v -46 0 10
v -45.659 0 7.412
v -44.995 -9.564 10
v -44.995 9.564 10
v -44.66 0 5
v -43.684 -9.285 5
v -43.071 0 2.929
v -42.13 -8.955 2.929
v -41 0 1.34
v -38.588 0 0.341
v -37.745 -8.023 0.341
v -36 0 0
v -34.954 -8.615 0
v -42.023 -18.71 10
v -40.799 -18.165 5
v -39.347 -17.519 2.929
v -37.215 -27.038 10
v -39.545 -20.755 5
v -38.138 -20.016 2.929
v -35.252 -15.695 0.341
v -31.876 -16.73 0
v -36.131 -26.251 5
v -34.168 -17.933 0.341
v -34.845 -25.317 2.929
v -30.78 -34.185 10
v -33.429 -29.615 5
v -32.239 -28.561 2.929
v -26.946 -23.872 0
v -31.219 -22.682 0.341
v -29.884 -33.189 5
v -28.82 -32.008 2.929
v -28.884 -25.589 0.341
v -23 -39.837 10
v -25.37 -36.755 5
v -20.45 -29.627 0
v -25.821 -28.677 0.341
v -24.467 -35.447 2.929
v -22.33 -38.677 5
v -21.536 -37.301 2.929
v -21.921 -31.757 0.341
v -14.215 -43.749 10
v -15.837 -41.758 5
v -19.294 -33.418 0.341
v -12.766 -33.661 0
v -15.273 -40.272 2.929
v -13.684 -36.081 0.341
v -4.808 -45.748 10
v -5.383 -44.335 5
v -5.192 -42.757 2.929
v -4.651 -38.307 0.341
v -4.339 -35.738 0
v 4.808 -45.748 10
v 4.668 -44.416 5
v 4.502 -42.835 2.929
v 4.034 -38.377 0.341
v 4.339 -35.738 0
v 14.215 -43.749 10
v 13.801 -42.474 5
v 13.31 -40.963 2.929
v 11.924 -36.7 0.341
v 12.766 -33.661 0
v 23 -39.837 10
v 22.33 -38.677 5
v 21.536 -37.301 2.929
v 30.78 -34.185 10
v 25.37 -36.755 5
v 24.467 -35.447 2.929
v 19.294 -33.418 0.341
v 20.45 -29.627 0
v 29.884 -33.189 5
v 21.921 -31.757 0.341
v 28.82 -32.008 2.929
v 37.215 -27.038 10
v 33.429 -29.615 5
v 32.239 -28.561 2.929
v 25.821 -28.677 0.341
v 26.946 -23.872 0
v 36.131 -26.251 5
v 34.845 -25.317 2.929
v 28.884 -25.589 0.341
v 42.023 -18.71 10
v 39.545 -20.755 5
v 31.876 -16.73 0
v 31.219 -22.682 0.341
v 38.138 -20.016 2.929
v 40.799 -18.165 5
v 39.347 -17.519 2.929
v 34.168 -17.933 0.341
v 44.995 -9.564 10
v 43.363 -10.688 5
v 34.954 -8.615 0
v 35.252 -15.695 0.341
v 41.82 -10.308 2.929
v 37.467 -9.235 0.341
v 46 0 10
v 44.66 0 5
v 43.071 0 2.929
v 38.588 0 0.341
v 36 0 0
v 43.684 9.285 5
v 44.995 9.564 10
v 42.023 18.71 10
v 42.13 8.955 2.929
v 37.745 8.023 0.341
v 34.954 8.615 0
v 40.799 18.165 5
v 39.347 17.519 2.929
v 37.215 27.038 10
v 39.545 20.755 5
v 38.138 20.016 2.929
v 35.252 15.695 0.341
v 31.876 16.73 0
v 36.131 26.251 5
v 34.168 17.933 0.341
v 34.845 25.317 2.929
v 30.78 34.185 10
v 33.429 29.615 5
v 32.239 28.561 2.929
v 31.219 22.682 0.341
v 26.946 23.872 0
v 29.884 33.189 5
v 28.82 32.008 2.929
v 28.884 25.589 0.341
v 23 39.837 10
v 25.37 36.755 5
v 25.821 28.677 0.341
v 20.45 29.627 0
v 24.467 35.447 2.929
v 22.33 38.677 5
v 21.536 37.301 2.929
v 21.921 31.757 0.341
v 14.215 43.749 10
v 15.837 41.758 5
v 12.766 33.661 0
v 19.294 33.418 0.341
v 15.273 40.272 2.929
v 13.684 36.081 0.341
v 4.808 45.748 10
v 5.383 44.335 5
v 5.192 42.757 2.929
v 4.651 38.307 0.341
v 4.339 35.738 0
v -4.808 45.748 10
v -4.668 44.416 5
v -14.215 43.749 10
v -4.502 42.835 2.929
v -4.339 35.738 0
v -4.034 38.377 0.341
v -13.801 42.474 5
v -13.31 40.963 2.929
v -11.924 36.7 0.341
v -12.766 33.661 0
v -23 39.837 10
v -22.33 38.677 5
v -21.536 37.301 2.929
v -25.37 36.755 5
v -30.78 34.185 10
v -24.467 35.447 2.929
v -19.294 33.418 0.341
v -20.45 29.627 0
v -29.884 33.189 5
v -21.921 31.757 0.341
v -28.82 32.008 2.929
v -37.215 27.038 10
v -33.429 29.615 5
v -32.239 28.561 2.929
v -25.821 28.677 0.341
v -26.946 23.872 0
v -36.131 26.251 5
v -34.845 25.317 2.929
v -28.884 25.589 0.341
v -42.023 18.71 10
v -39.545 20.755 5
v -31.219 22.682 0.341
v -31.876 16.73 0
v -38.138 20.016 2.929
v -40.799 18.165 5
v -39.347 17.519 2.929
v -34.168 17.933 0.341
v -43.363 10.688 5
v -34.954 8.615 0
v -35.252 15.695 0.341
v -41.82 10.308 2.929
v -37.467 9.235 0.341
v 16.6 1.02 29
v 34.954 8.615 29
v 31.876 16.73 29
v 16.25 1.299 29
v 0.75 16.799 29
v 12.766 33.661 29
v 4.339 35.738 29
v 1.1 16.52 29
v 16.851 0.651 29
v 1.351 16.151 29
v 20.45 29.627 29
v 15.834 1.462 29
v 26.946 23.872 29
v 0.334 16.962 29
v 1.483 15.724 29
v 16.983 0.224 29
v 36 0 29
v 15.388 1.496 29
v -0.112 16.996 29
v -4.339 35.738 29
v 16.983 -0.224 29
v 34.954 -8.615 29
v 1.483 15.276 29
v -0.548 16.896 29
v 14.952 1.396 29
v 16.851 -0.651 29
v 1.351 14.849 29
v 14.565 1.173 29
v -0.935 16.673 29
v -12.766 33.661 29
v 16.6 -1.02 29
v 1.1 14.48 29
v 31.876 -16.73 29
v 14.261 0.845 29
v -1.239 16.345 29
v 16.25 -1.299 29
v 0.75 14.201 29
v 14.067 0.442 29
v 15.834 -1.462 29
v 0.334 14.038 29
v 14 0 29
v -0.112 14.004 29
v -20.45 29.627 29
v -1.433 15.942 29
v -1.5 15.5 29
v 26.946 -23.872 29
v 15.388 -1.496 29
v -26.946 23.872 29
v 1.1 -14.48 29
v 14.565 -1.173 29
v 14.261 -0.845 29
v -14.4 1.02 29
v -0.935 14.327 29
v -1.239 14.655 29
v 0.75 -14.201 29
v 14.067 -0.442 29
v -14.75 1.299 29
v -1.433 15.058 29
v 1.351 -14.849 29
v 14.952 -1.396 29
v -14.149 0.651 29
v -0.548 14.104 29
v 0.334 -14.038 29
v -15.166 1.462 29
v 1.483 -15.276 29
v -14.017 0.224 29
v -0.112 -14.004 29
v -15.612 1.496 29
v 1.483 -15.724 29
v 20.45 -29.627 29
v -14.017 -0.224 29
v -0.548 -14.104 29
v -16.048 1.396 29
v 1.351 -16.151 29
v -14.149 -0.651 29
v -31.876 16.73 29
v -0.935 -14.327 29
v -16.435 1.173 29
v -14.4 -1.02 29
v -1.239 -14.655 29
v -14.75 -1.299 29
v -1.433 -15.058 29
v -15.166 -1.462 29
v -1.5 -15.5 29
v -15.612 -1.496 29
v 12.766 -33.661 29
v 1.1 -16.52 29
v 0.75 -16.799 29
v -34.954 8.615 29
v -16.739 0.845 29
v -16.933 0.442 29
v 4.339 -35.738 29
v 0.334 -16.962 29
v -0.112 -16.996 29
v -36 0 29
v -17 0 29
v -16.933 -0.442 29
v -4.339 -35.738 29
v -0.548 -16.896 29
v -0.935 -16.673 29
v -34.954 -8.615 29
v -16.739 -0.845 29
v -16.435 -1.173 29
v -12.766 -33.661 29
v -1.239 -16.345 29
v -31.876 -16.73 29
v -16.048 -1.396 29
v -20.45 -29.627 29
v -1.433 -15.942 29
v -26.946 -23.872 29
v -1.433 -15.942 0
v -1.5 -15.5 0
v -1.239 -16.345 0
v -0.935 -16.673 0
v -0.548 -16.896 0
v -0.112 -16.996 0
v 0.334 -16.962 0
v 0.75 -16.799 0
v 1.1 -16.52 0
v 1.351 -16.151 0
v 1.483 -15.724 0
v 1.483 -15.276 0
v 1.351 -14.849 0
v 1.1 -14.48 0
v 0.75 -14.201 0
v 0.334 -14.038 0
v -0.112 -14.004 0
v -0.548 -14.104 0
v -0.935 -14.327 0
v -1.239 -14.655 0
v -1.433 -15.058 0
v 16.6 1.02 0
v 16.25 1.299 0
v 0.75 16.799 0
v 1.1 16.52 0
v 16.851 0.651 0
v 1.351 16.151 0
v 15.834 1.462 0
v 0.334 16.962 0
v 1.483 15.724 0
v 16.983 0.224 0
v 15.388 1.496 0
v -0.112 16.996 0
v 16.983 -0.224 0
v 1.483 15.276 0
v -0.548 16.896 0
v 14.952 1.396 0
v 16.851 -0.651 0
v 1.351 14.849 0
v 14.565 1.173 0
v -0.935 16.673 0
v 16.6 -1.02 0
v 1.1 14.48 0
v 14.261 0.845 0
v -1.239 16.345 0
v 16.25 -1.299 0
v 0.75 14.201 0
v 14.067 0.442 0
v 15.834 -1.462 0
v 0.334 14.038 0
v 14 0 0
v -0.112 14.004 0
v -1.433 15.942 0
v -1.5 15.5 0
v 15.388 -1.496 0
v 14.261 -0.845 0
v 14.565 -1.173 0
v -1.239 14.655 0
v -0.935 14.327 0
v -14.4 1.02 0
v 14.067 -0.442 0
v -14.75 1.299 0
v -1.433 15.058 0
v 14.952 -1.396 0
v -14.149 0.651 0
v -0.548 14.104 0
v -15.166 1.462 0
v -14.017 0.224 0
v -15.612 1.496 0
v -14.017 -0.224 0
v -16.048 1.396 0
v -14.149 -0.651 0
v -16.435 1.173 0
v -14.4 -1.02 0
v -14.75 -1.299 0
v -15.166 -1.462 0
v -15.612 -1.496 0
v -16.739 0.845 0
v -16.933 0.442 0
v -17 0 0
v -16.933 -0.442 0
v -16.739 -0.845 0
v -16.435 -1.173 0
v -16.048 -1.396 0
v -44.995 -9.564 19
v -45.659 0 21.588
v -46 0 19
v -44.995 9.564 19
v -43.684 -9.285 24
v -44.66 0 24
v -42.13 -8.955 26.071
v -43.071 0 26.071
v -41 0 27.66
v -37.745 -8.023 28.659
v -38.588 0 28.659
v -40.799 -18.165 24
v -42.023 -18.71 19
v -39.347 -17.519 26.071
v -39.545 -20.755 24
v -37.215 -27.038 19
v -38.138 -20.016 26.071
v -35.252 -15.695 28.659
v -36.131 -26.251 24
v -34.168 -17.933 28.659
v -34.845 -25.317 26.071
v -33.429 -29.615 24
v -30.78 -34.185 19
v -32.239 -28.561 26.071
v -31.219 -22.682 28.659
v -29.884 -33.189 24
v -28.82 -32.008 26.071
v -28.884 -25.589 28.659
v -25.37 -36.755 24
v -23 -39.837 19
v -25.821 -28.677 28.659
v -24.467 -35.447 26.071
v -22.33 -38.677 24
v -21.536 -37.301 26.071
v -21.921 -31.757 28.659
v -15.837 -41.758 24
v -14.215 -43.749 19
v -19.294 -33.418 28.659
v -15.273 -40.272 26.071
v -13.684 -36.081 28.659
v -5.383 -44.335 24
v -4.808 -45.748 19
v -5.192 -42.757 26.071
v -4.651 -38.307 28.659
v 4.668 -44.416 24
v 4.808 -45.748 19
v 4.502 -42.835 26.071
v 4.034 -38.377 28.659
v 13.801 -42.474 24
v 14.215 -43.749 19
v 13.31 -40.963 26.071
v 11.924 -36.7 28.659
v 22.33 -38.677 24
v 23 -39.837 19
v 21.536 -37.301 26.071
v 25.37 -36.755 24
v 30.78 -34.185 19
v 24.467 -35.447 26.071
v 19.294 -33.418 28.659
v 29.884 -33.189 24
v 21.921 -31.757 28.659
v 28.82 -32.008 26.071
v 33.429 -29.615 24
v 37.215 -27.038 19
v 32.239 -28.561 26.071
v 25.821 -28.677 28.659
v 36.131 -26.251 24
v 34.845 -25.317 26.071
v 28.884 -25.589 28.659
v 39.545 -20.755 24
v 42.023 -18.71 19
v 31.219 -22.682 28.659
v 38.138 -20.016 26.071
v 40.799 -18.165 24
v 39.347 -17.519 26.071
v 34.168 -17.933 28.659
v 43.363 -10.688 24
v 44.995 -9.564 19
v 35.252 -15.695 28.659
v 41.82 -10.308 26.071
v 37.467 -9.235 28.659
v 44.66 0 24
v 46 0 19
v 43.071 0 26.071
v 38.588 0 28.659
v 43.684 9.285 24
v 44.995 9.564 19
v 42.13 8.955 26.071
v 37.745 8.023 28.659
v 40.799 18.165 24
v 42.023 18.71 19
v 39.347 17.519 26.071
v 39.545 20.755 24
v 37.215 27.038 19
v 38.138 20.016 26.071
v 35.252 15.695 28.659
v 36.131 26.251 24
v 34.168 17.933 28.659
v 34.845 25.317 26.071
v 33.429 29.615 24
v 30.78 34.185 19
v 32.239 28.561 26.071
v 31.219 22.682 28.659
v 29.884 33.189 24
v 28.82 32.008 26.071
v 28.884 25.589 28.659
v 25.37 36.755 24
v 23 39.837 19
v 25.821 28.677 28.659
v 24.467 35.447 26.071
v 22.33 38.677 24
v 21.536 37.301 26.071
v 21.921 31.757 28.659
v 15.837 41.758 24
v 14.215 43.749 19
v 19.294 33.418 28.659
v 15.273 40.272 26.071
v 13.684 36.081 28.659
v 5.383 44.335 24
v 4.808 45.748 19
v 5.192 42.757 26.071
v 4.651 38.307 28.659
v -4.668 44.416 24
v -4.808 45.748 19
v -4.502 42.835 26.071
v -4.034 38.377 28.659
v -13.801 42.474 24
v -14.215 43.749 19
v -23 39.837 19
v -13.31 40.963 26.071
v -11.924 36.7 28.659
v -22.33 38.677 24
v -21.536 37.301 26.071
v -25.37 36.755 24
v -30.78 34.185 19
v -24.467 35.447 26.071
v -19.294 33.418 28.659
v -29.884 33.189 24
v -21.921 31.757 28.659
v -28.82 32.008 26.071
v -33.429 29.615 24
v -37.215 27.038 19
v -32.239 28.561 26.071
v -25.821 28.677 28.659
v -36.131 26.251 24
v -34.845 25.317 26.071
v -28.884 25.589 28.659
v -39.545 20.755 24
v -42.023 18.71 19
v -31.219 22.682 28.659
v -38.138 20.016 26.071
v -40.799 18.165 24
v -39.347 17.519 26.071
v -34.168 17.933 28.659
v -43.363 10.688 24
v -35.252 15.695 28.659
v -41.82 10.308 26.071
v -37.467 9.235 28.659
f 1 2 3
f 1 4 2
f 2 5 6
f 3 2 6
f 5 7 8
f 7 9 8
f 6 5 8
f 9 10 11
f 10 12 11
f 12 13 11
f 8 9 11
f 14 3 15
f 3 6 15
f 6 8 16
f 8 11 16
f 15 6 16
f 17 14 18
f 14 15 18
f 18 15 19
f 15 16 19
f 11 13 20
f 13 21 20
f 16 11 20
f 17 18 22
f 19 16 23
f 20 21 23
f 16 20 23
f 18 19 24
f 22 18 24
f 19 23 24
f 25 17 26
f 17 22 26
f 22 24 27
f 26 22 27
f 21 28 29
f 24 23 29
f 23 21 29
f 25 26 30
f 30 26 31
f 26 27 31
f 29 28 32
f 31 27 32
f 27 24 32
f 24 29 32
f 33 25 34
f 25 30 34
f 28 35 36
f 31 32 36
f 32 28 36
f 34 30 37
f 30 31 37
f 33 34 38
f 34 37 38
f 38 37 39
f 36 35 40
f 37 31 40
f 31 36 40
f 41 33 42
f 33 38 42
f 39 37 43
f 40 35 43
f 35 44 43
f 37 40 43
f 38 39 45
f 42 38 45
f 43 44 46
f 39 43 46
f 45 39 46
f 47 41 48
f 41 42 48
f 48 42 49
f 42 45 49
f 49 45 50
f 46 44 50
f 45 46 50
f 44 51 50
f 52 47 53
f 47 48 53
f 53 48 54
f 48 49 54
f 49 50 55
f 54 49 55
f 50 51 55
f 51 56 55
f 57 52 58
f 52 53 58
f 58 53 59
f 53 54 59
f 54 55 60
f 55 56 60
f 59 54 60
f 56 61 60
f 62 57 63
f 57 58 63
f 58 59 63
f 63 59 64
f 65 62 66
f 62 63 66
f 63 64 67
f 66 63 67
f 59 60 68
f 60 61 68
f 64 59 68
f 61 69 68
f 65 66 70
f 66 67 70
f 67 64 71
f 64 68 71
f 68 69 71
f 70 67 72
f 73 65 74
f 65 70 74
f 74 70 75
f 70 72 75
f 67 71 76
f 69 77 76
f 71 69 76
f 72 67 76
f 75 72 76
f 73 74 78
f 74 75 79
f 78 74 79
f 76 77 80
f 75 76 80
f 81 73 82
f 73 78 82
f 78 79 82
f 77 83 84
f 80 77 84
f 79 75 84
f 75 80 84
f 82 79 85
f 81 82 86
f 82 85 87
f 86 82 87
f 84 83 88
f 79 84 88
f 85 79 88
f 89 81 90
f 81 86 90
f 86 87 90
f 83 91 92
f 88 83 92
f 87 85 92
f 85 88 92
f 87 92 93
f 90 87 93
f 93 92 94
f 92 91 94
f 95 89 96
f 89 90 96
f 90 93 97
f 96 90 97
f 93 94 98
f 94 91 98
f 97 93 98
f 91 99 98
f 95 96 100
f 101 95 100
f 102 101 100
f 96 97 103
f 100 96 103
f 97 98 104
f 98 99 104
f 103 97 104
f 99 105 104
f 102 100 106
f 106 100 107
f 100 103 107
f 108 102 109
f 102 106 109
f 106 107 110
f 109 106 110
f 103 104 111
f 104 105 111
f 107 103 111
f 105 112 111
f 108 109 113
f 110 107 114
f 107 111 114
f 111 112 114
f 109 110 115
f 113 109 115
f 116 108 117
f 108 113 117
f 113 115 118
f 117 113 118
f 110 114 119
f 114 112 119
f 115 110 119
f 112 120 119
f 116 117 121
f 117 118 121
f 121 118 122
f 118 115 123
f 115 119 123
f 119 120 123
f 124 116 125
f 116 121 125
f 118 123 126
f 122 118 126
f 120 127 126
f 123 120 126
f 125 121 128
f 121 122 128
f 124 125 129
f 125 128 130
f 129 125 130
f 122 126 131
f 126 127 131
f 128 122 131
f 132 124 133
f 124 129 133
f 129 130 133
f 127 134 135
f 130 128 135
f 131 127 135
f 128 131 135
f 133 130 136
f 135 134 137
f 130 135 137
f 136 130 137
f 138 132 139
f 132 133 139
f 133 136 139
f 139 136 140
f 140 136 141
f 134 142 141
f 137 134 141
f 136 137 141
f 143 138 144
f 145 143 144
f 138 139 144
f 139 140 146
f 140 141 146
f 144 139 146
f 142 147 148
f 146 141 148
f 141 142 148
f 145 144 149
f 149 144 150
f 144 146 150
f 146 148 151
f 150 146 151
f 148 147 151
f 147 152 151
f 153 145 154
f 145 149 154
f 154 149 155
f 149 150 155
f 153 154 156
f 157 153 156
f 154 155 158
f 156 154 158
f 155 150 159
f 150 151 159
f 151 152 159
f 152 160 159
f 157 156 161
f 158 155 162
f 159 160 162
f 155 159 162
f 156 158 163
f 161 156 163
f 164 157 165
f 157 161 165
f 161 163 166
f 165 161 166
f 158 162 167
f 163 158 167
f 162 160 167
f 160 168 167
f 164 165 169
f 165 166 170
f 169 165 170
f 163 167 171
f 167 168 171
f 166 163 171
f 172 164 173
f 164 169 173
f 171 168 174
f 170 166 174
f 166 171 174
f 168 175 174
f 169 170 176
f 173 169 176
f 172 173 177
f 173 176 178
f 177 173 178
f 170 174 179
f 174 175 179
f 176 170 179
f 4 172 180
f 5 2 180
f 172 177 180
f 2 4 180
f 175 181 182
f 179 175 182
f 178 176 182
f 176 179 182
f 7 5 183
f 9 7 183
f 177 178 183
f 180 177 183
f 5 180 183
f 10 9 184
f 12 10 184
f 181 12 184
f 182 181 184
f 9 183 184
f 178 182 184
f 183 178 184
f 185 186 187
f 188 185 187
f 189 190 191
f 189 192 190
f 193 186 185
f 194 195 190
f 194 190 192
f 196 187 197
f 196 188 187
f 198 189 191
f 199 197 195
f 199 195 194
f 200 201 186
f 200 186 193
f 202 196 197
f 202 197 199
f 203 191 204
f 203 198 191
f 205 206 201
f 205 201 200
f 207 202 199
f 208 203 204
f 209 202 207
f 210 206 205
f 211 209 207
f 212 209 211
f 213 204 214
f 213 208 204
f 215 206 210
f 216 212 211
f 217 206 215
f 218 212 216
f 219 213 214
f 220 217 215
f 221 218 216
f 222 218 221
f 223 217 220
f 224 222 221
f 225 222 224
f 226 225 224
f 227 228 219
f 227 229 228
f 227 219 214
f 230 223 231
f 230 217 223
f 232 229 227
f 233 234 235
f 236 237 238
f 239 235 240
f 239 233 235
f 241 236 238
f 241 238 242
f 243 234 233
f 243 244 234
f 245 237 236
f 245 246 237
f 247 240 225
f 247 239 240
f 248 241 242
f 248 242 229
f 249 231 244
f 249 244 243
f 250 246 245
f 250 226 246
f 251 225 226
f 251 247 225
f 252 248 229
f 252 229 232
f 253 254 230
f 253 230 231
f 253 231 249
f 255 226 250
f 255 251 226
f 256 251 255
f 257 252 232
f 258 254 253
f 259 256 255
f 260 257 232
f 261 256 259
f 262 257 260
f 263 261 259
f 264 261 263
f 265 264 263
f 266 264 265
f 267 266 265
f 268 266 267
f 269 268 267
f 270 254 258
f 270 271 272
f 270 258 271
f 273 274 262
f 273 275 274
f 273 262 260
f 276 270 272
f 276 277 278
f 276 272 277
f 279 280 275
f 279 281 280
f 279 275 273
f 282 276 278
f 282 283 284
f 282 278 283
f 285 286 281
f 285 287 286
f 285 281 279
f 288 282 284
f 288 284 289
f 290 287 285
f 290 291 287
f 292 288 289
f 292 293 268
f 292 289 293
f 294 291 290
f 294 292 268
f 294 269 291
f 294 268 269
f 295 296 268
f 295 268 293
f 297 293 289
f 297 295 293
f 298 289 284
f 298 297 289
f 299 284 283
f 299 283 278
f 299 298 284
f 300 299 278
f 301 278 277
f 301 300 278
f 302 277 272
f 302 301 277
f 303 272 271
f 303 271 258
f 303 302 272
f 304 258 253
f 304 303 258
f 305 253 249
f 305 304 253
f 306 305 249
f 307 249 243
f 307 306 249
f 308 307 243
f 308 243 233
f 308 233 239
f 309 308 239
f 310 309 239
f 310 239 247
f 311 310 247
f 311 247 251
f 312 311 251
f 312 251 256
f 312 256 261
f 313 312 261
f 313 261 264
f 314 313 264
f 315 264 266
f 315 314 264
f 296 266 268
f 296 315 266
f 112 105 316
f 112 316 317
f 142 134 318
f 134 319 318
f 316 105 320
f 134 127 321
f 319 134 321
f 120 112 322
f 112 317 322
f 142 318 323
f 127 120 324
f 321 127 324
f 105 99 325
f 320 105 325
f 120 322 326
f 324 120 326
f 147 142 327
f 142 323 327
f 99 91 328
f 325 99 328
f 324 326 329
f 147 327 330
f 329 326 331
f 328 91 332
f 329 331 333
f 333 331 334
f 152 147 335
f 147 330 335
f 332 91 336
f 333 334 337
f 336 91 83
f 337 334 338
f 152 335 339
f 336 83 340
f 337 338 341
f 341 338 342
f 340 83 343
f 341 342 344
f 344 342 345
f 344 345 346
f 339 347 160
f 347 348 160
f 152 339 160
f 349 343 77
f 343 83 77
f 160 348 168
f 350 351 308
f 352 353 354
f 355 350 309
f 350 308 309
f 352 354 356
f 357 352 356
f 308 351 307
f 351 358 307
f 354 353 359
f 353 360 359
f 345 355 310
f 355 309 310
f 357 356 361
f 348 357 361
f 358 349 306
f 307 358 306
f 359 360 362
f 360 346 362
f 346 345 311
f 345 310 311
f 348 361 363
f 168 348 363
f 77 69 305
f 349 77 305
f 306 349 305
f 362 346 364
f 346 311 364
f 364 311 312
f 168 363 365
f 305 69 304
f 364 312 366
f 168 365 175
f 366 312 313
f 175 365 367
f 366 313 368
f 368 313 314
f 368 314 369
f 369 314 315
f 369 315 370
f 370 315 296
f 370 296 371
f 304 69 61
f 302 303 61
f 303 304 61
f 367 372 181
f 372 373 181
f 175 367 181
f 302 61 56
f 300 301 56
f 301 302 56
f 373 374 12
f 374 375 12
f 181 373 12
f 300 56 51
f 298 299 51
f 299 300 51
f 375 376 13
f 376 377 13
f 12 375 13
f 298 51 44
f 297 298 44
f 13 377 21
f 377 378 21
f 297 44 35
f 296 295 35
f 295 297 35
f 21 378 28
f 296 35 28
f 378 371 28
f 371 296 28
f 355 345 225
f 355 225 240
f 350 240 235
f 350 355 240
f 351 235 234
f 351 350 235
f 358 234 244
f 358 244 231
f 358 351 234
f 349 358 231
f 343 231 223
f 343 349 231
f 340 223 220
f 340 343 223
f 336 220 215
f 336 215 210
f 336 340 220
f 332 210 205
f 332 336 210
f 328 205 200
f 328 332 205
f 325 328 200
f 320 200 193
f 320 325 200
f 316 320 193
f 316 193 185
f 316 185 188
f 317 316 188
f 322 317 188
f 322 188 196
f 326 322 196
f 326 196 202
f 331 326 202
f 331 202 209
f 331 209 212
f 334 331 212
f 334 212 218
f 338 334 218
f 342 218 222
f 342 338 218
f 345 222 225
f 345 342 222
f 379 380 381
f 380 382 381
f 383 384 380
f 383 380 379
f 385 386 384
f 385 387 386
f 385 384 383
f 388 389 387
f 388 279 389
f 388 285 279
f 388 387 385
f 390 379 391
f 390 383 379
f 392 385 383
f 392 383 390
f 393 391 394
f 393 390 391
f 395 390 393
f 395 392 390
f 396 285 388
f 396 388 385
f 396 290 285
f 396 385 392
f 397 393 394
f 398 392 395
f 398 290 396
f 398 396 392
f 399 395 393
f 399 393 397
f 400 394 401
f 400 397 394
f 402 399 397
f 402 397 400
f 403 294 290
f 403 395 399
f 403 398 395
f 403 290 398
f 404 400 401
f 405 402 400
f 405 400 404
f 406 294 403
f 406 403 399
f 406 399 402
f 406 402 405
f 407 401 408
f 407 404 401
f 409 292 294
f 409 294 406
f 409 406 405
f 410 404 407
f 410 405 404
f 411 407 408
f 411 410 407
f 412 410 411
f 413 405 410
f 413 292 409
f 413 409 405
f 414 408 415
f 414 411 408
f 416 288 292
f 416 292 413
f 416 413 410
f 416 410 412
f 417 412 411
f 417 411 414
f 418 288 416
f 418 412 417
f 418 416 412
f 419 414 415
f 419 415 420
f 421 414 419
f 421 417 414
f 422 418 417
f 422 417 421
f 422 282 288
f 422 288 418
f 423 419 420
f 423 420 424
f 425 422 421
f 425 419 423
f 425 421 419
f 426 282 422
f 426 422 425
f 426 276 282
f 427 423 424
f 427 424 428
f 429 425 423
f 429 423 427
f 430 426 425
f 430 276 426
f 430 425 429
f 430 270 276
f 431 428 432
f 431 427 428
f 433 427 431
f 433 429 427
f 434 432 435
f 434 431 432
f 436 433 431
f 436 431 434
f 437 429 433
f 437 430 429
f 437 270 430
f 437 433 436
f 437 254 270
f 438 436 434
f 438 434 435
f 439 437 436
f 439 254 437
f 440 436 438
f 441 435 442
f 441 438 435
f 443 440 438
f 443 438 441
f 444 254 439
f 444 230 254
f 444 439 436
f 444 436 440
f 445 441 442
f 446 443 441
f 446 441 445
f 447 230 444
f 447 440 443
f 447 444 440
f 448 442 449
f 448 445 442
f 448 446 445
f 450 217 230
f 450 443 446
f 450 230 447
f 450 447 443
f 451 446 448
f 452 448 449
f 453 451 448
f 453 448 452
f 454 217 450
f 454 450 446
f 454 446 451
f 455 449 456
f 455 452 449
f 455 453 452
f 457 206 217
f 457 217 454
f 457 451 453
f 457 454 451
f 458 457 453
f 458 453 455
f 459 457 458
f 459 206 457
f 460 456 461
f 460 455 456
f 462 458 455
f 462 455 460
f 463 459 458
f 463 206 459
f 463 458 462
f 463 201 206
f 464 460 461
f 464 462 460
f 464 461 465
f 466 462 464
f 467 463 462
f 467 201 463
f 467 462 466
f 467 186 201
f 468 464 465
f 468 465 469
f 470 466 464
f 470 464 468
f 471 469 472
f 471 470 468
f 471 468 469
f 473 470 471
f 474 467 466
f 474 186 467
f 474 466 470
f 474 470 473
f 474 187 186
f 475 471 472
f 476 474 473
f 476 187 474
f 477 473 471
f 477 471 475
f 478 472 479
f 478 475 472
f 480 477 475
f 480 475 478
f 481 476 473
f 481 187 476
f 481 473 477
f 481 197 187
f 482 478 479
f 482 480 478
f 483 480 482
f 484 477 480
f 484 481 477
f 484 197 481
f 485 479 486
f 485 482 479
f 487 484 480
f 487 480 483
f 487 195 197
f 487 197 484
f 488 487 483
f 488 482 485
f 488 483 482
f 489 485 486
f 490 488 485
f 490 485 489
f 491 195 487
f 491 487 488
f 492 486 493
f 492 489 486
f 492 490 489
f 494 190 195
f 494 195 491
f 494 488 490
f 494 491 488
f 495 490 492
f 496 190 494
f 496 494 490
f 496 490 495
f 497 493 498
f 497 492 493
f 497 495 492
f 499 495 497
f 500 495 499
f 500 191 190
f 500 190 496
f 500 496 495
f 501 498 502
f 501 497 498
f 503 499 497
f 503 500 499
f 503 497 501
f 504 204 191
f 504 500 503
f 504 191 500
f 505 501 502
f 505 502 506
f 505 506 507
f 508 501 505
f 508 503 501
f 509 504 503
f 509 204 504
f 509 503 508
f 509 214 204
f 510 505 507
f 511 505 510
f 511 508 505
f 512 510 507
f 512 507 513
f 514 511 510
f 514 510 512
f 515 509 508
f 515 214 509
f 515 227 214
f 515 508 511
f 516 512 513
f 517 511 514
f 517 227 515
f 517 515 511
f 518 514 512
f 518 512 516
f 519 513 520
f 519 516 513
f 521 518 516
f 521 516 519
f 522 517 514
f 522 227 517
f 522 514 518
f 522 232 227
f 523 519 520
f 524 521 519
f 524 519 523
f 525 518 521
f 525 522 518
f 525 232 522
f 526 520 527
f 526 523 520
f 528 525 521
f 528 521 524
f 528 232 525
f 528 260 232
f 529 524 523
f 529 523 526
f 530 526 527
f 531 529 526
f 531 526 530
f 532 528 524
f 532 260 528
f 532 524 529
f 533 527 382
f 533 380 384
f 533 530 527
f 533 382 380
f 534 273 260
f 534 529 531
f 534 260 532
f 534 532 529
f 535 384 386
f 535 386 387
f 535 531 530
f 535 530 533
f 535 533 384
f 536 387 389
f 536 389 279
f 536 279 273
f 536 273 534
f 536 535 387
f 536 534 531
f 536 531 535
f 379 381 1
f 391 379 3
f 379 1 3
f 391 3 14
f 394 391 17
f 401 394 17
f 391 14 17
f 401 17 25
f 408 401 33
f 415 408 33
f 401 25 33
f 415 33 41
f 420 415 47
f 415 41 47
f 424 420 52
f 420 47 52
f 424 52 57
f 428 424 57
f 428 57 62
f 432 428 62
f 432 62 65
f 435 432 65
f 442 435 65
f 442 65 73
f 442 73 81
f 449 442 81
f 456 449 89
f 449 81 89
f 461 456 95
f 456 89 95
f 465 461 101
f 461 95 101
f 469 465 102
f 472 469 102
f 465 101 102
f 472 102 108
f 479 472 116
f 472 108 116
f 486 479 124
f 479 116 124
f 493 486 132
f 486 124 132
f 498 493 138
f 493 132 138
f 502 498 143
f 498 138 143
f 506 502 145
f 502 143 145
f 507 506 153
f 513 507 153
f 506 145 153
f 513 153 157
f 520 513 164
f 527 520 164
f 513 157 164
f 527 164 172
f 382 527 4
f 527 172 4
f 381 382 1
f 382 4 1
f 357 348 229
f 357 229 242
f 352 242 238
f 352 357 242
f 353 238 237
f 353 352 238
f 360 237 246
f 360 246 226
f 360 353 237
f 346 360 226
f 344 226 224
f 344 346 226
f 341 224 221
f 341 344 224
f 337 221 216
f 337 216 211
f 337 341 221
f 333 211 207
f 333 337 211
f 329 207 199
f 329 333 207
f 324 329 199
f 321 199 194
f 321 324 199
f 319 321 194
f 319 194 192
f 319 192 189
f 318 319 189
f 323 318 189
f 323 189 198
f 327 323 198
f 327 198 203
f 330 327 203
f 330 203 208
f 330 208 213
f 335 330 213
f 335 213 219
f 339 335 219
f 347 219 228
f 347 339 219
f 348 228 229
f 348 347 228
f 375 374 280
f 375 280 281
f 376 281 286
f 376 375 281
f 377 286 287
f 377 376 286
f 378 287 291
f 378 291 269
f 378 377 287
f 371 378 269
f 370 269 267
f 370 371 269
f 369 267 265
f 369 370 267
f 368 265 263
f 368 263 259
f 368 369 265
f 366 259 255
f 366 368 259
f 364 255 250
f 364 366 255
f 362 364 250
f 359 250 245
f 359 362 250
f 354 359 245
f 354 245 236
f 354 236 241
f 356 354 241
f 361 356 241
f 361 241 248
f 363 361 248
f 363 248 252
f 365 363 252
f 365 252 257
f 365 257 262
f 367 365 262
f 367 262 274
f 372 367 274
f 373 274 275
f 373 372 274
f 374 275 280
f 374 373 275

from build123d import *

# Parameters (mm, degrees)
SKETCH_1_R      = 46
SKETCH_1_R_2    = 1.5
EXTRUDE_1_DEPTH = 29
FILLET_1_R      = 10
FILLET_2_R      = 10


with BuildPart() as part:
    # 草图1 → 凸台-拉伸1 (new body)
    with BuildSketch(Plane.XY):
        with Locations(Location((0, 0, 0), (0, 0, 180))):
            Circle(SKETCH_1_R)
        with Locations(Location((0, -15.5, 0), (0, 0, 180))):
            Circle(SKETCH_1_R_2, mode=Mode.SUBTRACT)
        with Locations(Location((-15.5, 0, 0), (0, 0, 180))):
            Circle(SKETCH_1_R_2, mode=Mode.SUBTRACT)
        with Locations(Location((0, 15.5, 0), (0, 0, 180))):
            Circle(SKETCH_1_R_2, mode=Mode.SUBTRACT)
        with Locations(Location((15.5, 0, 0), (0, 0, 180))):
            Circle(SKETCH_1_R_2, mode=Mode.SUBTRACT)
    extrude(amount=EXTRUDE_1_DEPTH)

    # 圆角1
    fillet_1_edges = [part.edges().sort_by_distance(p)[0] for p in [
        (46, 0, 29),
    ]]
    fillet(fillet_1_edges, radius=FILLET_1_R)

    # 圆角2
    fillet_2_edges = [part.edges().sort_by_distance(p)[0] for p in [
        (46, 0, 0),
    ]]
    fillet(fillet_2_edges, radius=FILLET_2_R)


solid = part.part
